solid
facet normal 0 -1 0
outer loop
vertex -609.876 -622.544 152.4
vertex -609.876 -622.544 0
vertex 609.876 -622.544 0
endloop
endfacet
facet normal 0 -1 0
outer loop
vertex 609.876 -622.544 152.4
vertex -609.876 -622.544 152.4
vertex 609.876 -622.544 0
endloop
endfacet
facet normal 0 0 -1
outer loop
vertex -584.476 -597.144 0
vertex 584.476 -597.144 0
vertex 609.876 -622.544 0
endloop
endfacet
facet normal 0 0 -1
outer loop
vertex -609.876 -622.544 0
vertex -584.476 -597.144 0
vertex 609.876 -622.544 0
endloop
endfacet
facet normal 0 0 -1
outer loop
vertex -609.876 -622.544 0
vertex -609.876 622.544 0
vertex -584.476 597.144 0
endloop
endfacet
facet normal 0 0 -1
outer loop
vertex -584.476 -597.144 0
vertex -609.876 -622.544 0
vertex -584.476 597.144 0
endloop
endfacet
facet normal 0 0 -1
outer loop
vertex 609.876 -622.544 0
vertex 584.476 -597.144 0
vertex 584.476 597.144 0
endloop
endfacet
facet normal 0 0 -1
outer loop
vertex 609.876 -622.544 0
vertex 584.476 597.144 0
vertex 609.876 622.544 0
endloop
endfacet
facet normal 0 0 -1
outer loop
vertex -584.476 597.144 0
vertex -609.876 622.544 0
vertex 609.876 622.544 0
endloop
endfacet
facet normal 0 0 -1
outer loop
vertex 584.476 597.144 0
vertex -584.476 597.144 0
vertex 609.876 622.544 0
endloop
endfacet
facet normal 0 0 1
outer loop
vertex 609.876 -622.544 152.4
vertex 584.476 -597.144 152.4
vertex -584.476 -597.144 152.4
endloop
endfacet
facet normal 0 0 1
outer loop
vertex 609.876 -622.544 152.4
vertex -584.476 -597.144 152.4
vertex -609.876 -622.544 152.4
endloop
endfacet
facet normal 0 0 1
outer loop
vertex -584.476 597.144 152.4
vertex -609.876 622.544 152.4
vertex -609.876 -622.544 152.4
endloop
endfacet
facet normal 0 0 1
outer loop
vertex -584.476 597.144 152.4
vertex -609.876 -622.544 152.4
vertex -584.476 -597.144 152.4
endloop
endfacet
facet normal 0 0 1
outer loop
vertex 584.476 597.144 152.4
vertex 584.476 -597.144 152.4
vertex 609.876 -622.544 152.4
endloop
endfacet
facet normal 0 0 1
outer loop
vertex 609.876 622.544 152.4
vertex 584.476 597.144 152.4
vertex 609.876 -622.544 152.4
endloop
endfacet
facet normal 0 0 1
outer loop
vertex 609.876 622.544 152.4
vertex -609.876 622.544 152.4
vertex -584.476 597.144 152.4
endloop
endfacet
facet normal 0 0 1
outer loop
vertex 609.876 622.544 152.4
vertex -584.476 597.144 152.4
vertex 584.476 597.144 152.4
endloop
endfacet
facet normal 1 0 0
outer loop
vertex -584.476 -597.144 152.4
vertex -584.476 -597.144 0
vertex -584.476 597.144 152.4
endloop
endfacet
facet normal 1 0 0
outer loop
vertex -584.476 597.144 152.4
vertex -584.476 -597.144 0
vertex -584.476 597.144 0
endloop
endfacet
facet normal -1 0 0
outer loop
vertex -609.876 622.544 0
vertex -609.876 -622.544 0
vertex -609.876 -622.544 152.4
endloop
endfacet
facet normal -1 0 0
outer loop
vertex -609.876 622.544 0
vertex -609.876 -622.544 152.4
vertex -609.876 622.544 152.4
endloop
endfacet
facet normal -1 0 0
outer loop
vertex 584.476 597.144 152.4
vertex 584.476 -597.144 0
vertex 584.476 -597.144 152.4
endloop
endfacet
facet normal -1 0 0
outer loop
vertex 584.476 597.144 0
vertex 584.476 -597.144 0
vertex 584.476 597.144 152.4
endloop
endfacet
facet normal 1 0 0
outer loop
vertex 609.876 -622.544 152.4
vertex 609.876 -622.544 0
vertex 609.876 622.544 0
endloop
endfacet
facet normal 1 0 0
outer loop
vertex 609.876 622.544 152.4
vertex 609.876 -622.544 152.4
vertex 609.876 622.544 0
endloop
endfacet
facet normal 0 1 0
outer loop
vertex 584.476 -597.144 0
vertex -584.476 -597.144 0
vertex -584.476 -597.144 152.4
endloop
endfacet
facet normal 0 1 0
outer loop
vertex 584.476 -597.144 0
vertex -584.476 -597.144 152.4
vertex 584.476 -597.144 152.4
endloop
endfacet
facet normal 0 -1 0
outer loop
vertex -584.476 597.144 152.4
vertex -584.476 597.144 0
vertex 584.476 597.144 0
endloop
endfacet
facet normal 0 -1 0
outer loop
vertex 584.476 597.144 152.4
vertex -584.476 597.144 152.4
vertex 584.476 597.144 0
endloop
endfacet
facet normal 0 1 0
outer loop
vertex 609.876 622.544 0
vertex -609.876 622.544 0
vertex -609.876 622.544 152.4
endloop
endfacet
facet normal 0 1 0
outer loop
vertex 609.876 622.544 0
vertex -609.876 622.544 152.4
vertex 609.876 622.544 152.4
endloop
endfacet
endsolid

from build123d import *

# Parameters (mm, degrees)
F0_W     = 1168.9519882202
F0_H     = 1194.2882537842
F1_DEPTH = 152.4
F2_T     = 25.4


with BuildPart() as f1:
    # F0 (on Top) → F1 (new body)
    with BuildSketch(Plane.XY):
        Rectangle(F0_W, F0_H)
    extrude(amount=F1_DEPTH)

    # F2
    f2_openings = [f1.faces().sort_by_distance(p)[0] for p in [
        (0, 0, 0),
        (0, 0, 152.4),
    ]]
    offset(amount=F2_T, openings=f2_openings, kind=Kind.INTERSECTION)


solid = f1.part
